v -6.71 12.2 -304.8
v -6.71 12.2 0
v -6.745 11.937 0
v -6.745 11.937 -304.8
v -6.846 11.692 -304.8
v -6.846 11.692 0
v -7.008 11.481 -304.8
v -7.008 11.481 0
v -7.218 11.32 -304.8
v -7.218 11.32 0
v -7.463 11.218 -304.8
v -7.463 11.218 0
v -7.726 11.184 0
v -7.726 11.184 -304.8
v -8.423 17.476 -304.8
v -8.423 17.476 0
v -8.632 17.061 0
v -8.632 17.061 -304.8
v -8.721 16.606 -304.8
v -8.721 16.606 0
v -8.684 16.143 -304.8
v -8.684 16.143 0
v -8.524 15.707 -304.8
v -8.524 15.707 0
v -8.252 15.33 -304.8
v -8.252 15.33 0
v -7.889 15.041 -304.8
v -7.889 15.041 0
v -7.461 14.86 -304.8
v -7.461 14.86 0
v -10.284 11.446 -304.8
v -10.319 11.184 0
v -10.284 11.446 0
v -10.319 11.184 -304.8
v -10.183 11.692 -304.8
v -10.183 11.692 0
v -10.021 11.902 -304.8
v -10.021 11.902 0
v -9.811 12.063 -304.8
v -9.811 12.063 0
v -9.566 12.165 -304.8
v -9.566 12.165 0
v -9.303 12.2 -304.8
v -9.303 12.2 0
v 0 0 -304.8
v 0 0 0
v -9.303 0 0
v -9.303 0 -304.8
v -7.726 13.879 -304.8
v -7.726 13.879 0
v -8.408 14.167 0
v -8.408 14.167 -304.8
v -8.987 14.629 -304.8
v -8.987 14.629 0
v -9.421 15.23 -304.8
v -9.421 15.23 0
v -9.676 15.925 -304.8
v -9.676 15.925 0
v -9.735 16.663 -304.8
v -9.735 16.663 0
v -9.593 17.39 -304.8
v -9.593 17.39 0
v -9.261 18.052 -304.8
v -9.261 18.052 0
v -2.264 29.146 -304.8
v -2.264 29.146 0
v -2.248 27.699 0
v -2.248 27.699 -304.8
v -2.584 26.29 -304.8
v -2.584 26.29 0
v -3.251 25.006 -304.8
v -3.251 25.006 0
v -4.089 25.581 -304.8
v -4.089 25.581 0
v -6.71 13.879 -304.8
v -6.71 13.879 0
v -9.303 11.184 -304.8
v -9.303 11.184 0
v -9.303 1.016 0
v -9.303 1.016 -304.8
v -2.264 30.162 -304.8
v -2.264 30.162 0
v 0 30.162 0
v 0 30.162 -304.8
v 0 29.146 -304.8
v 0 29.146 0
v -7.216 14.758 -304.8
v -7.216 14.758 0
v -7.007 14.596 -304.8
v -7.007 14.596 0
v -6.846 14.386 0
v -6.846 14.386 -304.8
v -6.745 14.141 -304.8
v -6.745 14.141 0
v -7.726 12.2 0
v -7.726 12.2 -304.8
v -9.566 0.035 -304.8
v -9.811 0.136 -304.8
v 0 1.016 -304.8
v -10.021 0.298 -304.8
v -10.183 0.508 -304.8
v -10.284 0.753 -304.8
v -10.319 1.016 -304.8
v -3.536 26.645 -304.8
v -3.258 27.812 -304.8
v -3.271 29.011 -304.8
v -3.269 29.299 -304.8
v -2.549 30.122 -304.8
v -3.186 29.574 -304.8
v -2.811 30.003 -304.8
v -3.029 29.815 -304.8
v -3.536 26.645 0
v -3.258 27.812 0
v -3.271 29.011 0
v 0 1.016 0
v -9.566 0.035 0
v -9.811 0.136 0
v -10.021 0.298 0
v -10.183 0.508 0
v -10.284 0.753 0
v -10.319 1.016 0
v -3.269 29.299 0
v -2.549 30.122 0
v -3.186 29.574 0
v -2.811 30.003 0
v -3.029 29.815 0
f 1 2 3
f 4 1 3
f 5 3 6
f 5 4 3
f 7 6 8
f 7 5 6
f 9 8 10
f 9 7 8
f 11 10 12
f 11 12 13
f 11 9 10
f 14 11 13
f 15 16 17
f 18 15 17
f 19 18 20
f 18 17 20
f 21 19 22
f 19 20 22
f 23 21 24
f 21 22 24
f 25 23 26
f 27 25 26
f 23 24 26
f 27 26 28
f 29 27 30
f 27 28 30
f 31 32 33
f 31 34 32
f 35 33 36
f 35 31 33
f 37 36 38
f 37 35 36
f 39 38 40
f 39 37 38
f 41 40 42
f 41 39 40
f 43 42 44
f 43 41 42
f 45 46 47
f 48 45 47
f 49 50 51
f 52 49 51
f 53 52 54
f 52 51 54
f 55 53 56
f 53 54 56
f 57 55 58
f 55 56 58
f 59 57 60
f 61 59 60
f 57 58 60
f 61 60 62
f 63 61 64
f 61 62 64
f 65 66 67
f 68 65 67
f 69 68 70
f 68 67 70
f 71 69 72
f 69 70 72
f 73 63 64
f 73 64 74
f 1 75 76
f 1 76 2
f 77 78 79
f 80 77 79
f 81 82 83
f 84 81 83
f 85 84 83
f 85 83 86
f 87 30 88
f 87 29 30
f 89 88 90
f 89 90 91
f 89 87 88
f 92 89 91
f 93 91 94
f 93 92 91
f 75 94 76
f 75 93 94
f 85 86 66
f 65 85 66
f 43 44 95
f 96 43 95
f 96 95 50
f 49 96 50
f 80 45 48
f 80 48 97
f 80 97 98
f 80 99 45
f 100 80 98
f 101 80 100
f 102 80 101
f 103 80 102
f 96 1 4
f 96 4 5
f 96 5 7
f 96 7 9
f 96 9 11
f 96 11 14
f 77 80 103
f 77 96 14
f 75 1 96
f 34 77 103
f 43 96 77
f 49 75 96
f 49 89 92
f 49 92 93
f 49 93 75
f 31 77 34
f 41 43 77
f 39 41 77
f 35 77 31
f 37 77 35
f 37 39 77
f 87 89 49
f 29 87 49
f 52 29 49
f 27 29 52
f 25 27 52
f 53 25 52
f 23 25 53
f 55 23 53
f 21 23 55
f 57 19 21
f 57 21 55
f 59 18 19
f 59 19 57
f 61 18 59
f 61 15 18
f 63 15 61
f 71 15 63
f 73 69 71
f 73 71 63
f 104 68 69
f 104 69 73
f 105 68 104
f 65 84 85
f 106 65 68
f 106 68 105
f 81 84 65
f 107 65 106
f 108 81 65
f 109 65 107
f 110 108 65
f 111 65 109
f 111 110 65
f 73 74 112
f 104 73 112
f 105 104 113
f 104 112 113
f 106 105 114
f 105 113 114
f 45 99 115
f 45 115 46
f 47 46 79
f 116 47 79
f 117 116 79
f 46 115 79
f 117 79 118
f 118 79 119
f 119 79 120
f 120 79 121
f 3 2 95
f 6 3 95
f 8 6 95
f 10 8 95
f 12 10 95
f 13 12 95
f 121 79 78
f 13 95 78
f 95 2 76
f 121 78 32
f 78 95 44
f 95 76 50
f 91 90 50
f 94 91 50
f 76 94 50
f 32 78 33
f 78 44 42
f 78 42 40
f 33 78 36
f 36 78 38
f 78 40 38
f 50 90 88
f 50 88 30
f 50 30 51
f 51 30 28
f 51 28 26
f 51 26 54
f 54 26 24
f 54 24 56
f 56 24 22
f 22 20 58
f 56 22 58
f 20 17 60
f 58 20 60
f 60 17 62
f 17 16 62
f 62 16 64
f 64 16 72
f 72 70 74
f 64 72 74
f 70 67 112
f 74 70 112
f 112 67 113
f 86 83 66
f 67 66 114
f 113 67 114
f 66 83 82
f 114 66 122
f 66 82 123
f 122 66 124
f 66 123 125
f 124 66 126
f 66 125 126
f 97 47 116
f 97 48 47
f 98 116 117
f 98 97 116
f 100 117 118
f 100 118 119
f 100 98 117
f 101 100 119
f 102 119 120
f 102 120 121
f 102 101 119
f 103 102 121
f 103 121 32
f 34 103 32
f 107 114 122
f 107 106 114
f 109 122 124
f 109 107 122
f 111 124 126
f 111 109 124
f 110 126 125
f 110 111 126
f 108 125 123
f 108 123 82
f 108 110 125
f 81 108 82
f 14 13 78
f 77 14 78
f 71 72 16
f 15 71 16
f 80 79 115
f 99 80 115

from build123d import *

# Parameters (mm, degrees)
EXTRUDE_THIN1_DEPTH = 304.8
FILLET1_R           = 1.016


with BuildPart() as part:
    # Sketch1 → Extrude-Thin1 (new body)
    with BuildSketch(Plane.XY):
        with BuildLine():
            Line((0, 0), (-10.31875, 0))
            Line((-10.31875, 0), (-10.31875, 12.199518022))
            Line((-10.31875, 12.199518022), (-7.726000141, 12.199518022))
            Line((-7.726000141, 12.199518022), (-7.726000141, 13.878836266))
            ThreePointArc((-7.726000141, 13.878836266), (-9.572182479, 15.568472968), (-9.26085893, 18.051684409))
            Line((-9.26085893, 18.051684409), (-4.088758773, 25.580941853))
            ThreePointArc((-4.088758773, 25.580941853), (-3.258106429, 27.807165094), (-3.571875, 30.1625))
            Line((-3.571875, 30.1625), (0, 30.1625))
            Line((0, 30.1625), (0, 29.1465))
            Line((0, 29.1465), (-2.264128397, 29.1465))
            ThreePointArc((-2.264128397, 29.1465), (-2.372545269, 26.984258971), (-3.251310814, 25.005670685))
            Line((-3.251310814, 25.005670685), (-8.423410971, 17.476413241))
            ThreePointArc((-8.423410971, 17.476413241), (-8.449647278, 15.58096036), (-6.710000141, 14.827927951))
            Line((-6.710000141, 14.827927951), (-6.710000141, 11.183518022))
            Line((-6.710000141, 11.183518022), (-9.30275, 11.183518022))
            Line((-9.30275, 11.183518022), (-9.30275, 1.016))
            Line((-9.30275, 1.016), (0, 1.016))
            Line((0, 1.016), (0, 0))
        make_face()
    extrude(amount=-EXTRUDE_THIN1_DEPTH)

    # Fillet1
    fillet1_edges = [part.edges().sort_by_distance(p)[0] for p in [
        (-10.31875, 0, -152.4),
        (-10.31875, 12.199518022, -152.4),
        (-3.571875, 30.1625, -152.4),
        (-6.710000141, 14.827927951, -152.4),
        (-6.710000141, 11.183518022, -152.4),
    ]]
    fillet(fillet1_edges, radius=FILLET1_R)


solid = part.part
